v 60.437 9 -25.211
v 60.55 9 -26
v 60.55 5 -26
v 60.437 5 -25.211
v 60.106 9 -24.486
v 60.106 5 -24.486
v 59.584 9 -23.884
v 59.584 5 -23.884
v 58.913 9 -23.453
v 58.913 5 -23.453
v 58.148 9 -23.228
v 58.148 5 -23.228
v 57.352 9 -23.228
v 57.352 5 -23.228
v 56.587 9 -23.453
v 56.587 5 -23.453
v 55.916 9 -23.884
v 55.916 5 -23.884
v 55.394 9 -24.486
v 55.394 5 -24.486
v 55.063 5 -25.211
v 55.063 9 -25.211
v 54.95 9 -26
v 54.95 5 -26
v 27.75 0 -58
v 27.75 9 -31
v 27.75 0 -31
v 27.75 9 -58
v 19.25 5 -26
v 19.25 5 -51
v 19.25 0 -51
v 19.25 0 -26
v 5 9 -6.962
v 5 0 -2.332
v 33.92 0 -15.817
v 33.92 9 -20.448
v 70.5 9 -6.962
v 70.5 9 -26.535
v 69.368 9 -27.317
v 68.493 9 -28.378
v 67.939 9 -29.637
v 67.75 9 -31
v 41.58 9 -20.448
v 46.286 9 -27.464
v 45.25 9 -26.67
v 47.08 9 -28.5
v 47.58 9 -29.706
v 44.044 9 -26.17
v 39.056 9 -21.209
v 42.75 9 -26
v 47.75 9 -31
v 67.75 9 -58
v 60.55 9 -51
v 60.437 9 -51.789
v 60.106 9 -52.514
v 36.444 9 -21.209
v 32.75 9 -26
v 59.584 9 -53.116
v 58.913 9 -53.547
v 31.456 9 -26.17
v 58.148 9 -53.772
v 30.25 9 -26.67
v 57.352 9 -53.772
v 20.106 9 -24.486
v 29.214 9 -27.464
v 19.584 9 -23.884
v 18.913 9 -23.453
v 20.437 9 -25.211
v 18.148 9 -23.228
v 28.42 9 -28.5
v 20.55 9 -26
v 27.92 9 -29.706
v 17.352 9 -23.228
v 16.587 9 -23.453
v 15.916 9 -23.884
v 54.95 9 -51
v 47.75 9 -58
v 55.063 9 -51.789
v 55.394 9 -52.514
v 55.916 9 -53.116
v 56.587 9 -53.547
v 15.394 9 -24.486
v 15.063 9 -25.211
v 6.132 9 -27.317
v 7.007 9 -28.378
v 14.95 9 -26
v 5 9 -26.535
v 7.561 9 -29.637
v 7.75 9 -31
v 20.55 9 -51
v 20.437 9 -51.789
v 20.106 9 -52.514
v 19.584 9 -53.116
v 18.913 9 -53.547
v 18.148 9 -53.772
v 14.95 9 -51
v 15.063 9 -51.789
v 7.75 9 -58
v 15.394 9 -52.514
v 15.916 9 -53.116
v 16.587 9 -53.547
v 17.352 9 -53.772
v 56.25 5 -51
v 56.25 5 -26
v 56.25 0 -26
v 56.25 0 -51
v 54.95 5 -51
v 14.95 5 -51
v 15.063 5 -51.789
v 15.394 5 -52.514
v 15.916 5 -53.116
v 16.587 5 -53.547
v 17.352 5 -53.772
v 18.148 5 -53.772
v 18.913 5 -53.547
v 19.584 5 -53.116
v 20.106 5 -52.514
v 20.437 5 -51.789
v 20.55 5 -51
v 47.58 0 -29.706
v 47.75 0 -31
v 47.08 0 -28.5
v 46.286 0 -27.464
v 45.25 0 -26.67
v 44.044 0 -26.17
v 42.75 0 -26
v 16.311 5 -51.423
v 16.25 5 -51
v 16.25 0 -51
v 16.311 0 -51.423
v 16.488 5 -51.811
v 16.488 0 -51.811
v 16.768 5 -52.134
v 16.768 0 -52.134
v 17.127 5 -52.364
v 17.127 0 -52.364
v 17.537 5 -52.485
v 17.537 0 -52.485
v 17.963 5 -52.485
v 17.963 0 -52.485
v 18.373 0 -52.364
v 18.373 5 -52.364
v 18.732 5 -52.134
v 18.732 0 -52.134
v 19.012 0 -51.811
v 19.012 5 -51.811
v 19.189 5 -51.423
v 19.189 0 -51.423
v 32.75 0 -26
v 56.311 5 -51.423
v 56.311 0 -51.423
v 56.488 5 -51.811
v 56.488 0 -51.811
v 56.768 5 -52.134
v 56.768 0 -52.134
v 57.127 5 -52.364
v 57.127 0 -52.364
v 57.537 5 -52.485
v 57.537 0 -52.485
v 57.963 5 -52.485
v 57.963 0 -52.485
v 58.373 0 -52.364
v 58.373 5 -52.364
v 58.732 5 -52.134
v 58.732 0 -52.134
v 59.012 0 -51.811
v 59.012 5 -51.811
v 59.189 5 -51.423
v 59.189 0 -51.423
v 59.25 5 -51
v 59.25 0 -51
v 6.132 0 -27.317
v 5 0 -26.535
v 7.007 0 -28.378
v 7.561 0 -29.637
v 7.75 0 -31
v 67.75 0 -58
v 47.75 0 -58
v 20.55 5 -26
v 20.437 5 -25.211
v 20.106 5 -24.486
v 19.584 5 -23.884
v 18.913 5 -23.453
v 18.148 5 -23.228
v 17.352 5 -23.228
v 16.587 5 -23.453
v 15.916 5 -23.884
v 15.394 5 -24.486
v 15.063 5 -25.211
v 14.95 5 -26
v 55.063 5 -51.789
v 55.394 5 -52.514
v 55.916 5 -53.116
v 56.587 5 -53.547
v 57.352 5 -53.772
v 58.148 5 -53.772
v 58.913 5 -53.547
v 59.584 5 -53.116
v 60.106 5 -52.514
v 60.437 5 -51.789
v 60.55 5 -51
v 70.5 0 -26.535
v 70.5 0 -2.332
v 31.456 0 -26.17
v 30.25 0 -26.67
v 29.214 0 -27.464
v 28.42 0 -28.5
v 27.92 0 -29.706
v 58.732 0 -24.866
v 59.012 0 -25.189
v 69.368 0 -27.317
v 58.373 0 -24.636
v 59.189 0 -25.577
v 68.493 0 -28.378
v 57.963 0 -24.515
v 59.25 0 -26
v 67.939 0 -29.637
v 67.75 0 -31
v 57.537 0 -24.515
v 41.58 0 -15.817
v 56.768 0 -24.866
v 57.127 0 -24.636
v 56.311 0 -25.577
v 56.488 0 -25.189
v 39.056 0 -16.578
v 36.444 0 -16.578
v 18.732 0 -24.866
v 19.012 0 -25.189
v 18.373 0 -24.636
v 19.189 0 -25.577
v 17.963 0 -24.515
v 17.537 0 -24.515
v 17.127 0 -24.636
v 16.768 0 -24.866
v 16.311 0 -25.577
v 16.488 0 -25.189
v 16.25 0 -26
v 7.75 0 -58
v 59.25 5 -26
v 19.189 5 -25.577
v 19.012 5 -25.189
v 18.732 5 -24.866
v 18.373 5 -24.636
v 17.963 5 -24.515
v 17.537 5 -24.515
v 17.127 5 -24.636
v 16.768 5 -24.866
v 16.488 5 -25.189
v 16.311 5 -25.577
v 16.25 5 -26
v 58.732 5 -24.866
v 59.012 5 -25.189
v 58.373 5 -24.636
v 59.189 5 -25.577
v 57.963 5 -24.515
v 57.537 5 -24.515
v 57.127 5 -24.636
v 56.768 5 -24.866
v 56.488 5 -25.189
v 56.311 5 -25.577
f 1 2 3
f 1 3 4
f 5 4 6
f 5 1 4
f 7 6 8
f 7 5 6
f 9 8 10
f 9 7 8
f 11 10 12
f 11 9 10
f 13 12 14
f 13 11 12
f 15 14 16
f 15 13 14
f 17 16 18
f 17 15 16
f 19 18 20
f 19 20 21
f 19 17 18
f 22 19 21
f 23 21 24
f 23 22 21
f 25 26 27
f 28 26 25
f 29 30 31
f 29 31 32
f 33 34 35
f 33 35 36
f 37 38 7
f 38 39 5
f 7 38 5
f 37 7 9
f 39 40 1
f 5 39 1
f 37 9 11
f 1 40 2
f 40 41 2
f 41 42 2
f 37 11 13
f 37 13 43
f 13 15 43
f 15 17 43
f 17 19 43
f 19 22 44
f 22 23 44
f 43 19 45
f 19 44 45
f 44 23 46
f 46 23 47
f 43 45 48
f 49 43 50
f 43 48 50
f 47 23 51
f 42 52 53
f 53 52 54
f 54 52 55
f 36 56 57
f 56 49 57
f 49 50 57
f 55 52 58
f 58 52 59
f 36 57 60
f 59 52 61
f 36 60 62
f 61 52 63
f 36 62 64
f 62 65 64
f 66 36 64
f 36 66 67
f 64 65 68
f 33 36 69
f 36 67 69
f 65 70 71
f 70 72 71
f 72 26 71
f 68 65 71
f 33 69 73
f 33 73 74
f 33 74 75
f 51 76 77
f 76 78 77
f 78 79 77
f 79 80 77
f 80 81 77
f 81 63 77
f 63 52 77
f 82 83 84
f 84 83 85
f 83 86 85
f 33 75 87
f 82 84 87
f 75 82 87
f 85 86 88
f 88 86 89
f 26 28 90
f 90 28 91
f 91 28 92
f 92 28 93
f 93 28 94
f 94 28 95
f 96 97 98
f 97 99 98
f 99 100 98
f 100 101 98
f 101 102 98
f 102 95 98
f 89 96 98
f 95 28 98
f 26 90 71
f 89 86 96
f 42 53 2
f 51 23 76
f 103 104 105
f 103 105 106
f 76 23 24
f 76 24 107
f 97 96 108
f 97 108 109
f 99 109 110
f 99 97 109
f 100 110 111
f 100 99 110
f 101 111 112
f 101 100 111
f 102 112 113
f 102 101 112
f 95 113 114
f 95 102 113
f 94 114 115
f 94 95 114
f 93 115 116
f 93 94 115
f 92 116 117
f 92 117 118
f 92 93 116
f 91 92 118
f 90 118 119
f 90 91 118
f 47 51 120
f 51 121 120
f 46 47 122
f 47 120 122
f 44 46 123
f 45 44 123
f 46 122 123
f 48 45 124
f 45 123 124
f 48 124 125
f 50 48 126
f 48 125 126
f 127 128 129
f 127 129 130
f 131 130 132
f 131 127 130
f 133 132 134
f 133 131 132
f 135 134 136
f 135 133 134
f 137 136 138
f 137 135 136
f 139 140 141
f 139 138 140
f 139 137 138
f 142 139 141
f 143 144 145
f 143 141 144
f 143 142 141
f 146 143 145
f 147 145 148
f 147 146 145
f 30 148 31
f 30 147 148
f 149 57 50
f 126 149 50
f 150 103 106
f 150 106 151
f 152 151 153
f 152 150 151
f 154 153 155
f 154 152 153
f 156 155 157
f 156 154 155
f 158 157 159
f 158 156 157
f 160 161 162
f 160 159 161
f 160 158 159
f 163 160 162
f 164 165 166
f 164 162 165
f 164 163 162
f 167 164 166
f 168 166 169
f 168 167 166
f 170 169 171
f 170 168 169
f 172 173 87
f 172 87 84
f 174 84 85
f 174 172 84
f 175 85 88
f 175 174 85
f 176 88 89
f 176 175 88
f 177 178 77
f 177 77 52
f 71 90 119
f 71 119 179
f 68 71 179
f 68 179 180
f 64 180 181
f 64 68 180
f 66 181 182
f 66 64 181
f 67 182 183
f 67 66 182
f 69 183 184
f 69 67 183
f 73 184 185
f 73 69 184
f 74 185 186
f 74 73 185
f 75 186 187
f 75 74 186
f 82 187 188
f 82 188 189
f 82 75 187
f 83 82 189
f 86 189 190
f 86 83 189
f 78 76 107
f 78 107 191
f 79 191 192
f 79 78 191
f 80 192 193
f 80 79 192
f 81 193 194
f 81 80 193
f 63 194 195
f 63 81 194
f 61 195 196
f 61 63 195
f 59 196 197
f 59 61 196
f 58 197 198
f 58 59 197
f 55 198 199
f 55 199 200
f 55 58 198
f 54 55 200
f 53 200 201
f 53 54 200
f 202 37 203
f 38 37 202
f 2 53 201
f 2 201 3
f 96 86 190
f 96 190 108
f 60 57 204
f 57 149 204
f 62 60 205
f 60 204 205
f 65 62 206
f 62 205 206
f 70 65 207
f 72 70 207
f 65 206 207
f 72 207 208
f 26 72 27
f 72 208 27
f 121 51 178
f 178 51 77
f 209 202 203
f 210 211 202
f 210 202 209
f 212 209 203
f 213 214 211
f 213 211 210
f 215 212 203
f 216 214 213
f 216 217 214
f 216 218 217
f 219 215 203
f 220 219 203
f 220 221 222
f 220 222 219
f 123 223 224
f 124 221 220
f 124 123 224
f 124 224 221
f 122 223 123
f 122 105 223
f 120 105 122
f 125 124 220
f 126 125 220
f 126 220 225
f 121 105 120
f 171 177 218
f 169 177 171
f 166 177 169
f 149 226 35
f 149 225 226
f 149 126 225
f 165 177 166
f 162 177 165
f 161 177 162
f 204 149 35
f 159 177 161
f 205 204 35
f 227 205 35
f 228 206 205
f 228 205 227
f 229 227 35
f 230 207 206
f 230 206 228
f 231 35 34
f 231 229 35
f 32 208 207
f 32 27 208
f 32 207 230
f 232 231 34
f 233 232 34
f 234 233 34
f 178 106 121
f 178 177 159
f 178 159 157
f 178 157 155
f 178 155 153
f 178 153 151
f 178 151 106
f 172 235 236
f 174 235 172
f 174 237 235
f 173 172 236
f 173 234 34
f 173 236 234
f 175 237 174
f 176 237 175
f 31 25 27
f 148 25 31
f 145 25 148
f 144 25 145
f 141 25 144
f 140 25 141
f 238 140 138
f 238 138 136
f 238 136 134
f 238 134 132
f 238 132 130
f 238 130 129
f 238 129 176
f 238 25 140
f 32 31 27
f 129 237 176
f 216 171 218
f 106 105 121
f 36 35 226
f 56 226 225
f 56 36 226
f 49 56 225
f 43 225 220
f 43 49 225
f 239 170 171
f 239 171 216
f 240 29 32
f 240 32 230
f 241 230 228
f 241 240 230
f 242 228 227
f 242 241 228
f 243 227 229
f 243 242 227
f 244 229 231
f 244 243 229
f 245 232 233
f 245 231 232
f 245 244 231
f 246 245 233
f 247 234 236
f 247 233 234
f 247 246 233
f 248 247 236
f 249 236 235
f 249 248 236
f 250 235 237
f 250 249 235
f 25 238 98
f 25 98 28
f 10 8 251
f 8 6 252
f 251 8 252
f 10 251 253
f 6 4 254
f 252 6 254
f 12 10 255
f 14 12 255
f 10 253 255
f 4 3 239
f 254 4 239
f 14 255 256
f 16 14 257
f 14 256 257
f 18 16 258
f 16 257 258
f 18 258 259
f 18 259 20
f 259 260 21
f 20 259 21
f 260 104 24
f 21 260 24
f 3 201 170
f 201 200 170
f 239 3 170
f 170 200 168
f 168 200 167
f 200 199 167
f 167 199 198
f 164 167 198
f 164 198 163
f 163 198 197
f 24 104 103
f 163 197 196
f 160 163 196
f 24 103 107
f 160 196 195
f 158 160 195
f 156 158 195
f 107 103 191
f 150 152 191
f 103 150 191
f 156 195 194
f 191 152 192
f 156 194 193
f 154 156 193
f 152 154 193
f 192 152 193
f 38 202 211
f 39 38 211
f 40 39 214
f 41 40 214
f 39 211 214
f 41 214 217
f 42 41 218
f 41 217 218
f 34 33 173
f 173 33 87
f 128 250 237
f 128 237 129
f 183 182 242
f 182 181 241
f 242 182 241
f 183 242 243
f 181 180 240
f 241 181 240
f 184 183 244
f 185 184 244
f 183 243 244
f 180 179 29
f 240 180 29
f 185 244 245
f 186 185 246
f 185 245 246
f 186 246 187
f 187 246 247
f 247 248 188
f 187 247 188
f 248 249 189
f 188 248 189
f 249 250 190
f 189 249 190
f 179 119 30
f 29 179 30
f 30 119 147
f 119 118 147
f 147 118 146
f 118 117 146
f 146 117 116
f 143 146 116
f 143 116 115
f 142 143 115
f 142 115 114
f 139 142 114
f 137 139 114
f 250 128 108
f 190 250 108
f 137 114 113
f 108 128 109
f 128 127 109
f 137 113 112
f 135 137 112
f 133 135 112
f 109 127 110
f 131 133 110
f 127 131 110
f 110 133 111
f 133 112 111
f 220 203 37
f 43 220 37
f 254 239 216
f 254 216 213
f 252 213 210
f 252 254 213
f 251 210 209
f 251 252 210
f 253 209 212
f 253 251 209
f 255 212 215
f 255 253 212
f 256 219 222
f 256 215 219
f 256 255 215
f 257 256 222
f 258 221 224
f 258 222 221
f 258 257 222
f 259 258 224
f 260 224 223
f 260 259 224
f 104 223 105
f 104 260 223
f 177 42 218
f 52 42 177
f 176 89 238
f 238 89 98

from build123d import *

# Parameters (mm, degrees)
BOSS_EXTRUDE1_DEPTH = 9
CUT_EXTRUDE2_REACH  = 97.631
SKETCH5_W           = 20
SKETCH5_H           = 32
SKETCH5_W_2         = 7.75
CUT_EXTRUDE3_DEPTH  = 10
FILLET1_R           = 5
CUT_EXTRUDE4_DEPTH  = 4
CHAMFER1_SIZE       = 9
CHAMFER1_SIZE_2     = 4.196768923
FILLET2_R           = 10
CUT_EXTRUDE5_REACH  = 97.631
SKETCH7_W           = 5
SKETCH7_H           = 33.085129134
SKETCH7_H_2         = 33.745309592


with BuildPart() as part:
    # Sketch1 → Boss-Extrude1 (new body)
    with BuildSketch(Plane(origin=(0, 0, 0), x_dir=(1, 0, 0), z_dir=(0, 1, 0))):
        Polygon((0, 0), (0, 58), (75.5, 58), (75.5, 0), (37.75, 17.603114095), align=None)
    extrude(amount=BOSS_EXTRUDE1_DEPTH)

    # Sketch4 → Cut-Extrude2 (cut, up to next)
    with BuildSketch(Plane(origin=(0, 9, 0), x_dir=(1, 0, 0), z_dir=(0, 1, 0)), mode=Mode.PRIVATE) as cut_extrude2_sk1:
        with BuildLine():
            Line((19.25, 51), (19.25, 26))
            ThreePointArc((19.25, 26), (17.75, 24.5), (16.25, 26))
            Line((16.25, 26), (16.25, 51))
            ThreePointArc((16.25, 51), (17.75, 52.5), (19.25, 51))
        make_face()
    cut_extrude2_tool1 = extrude(cut_extrude2_sk1.sketch, amount=-CUT_EXTRUDE2_REACH, mode=Mode.PRIVATE) & part.part
    # Sketch4 → Cut-Extrude2 (cut, up to next)
    with BuildSketch(Plane(origin=(0, 9, 0), x_dir=(1, 0, 0), z_dir=(0, 1, 0)), mode=Mode.PRIVATE) as cut_extrude2_sk2:
        with BuildLine():
            Line((59.25, 51), (59.25, 26))
            ThreePointArc((59.25, 26), (57.75, 24.5), (56.25, 26))
            Line((56.25, 26), (56.25, 51))
            ThreePointArc((56.25, 51), (57.75, 52.5), (59.25, 51))
        make_face()
    cut_extrude2_tool2 = extrude(cut_extrude2_sk2.sketch, amount=-CUT_EXTRUDE2_REACH, mode=Mode.PRIVATE) & part.part
    add(cut_extrude2_tool1.solids().sort_by_distance((17.75, 9, -38.5))[0], mode=Mode.SUBTRACT)
    add(cut_extrude2_tool2.solids().sort_by_distance((57.75, 9, -38.5))[0], mode=Mode.SUBTRACT)

    # Sketch5 → Cut-Extrude3 (cut)
    with BuildSketch(Plane(origin=(0, 9, 0), x_dir=(1, 0, 0), z_dir=(0, 1, 0))):
        with Locations((37.75, 42)):
            Rectangle(SKETCH5_W, SKETCH5_H)
        with Locations((71.625, 42)):
            Rectangle(SKETCH5_W_2, SKETCH5_H)
        with Locations((3.875, 42)):
            Rectangle(SKETCH5_W_2, SKETCH5_H)
    extrude(amount=-CUT_EXTRUDE3_DEPTH, mode=Mode.SUBTRACT)

    # Fillet1
    fillet1_edges = [part.edges().sort_by_distance(p)[0] for p in [
        (27.75, 4.5, -26),
        (47.75, 4.5, -26),
        (7.75, 4.5, -26),
        (67.75, 4.5, -26),
    ]]
    fillet(fillet1_edges, radius=FILLET1_R)

    # Sketch6 → Cut-Extrude4 (cut)
    with BuildSketch(Plane(origin=(0, 9, 0), x_dir=(1, 0, 0), z_dir=(0, 1, 0))):
        with BuildLine():
            Line((20.55, 51), (20.55, 26))
            ThreePointArc((20.55, 26), (17.75, 23.2), (14.95, 26))
            Line((14.95, 26), (14.95, 51))
            ThreePointArc((14.95, 51), (17.75, 53.8), (20.55, 51))
        make_face()
        with BuildLine():
            Line((60.55, 51), (60.55, 26))
            ThreePointArc((60.55, 26), (57.75, 23.2), (54.95, 26))
            Line((54.95, 26), (54.95, 51))
            ThreePointArc((54.95, 51), (57.75, 53.8), (60.55, 51))
        make_face()
    extrude(amount=-CUT_EXTRUDE4_DEPTH, mode=Mode.SUBTRACT)

    # Chamfer1
    # the kernel refuses this chamfer: 9, 4.196768923 mm, written as the material it takes off along each edge
    with BuildSketch(Plane(origin=(96.633991212, 9, 9.85494195), x_dir=(-0.006893395832057369, -0.9998669641130703, 0.014782935067658582), z_dir=(-0.9063077870366479, 0, -0.42261826174070394))) as chamfer1_piece_1_section:
        Polygon((CHAMFER1_SIZE * 0.999866964113, -CHAMFER1_SIZE * 0.0163111641311), (-CHAMFER1_SIZE_2 * 0.0163111641326, -CHAMFER1_SIZE_2 * 0.999866964207), (0, 0), align=None)
    chamfer1_piece_1 = extrude(amount=88.290074926, mode=Mode.PRIVATE)
    chamfer1_piece_1 = split(chamfer1_piece_1, bisect_by=Plane(origin=(57.902621458, 5.937801532, -27.000435813), z_dir=(0.42261826174070394, 0, 0.9063077870366479)), keep=Keep.TOP, mode=Mode.PRIVATE)
    add(chamfer1_piece_1, mode=Mode.SUBTRACT)
    with BuildSketch(Plane(origin=(58.883991212, 9, -27.458056045), x_dir=(0.006893395832057004, -0.9998669641130703, 0.014782935067657803), z_dir=(-0.9063077870366479, 0, 0.42261826174070394))) as chamfer1_piece_2_section:
        Polygon((CHAMFER1_SIZE * 0.999866964113, -CHAMFER1_SIZE * 0.0163111641311), (-CHAMFER1_SIZE_2 * 0.0163111641326, -CHAMFER1_SIZE_2 * 0.999866964207), (0, 0), align=None)
    chamfer1_piece_2 = extrude(amount=88.290074926, mode=Mode.PRIVATE)
    chamfer1_piece_2 = split(chamfer1_piece_2, bisect_by=Plane(origin=(17.597378542, 5.937801532, -27.000435813), z_dir=(-0.42261826174070394, 0, 0.9063077870366479)), keep=Keep.TOP, mode=Mode.PRIVATE)
    add(chamfer1_piece_2, mode=Mode.SUBTRACT)
    with BuildSketch(Plane(origin=(96.633991212, 9, 9.85494195), x_dir=(-0.006893395832057369, -0.9998669641130703, 0.014782935067658582), z_dir=(-0.9063077870366479, 0, -0.42261826174070394))) as chamfer1_piece_3a_section:
        Polygon((CHAMFER1_SIZE * 0.999866964113, -CHAMFER1_SIZE * 0.0163111641311), (-CHAMFER1_SIZE_2 * 0.0163111641326, -CHAMFER1_SIZE_2 * 0.999866964207), (0, 0), align=None)
    chamfer1_piece_3a = extrude(amount=88.290074926, mode=Mode.PRIVATE)
    chamfer1_piece_3a = split(chamfer1_piece_3a, bisect_by=Plane(origin=(32.238129018, 6.0031385, -15.032886446), z_dir=(-0.42261826174070394, 0, -0.9063077870366479)), keep=Keep.TOP, mode=Mode.PRIVATE)
    with BuildSketch(Plane(origin=(58.883991212, 9, -27.458056045), x_dir=(0.006893395832057004, -0.9998669641130703, 0.014782935067657803), z_dir=(-0.9063077870366479, 0, 0.42261826174070394))) as chamfer1_piece_3b_section:
        Polygon((CHAMFER1_SIZE * 0.999866964113, -CHAMFER1_SIZE * 0.0163111641311), (-CHAMFER1_SIZE_2 * 0.0163111641326, -CHAMFER1_SIZE_2 * 0.999866964207), (0, 0), align=None)
    chamfer1_piece_3b = extrude(amount=88.290074926, mode=Mode.PRIVATE)
    chamfer1_piece_3b = split(chamfer1_piece_3b, bisect_by=Plane(origin=(43.261870982, 6.0031385, -15.032886446), z_dir=(0.42261826174070394, 0, -0.9063077870366479)), keep=Keep.TOP, mode=Mode.PRIVATE)
    chamfer1_piece_3 = chamfer1_piece_3a & chamfer1_piece_3b
    add(chamfer1_piece_3, mode=Mode.SUBTRACT)

    # Fillet2
    fillet2_edges = [part.edges().sort_by_distance(p)[0] for p in [
        (37.75, 4.5, -19.918425176),
    ]]
    fillet(fillet2_edges, radius=FILLET2_R)

    # Sketch7 → Cut-Extrude5 (cut, up to next)
    with BuildSketch(Plane(origin=(0, 9, 0), x_dir=(1, 0, 0), z_dir=(0, 1, 0)), mode=Mode.PRIVATE) as cut_extrude5_sk1:
        with Locations((2.5, 16.542564567)):
            Rectangle(SKETCH7_W, SKETCH7_H)
    cut_extrude5_tool1 = extrude(cut_extrude5_sk1.sketch, amount=-CUT_EXTRUDE5_REACH, mode=Mode.PRIVATE) & part.part
    # Sketch7 → Cut-Extrude5 (cut, up to next)
    with BuildSketch(Plane(origin=(0, 9, 0), x_dir=(1, 0, 0), z_dir=(0, 1, 0)), mode=Mode.PRIVATE) as cut_extrude5_sk2:
        with Locations((73, 16.872654796)):
            Rectangle(SKETCH7_W, SKETCH7_H_2)
    cut_extrude5_tool2 = extrude(cut_extrude5_sk2.sketch, amount=-CUT_EXTRUDE5_REACH, mode=Mode.PRIVATE) & part.part
    add(cut_extrude5_tool1.solids().sort_by_distance((2.5, 9, -16.542565))[0], mode=Mode.SUBTRACT)
    add(cut_extrude5_tool2.solids().sort_by_distance((73, 9, -16.872655))[0], mode=Mode.SUBTRACT)


solid = part.part
